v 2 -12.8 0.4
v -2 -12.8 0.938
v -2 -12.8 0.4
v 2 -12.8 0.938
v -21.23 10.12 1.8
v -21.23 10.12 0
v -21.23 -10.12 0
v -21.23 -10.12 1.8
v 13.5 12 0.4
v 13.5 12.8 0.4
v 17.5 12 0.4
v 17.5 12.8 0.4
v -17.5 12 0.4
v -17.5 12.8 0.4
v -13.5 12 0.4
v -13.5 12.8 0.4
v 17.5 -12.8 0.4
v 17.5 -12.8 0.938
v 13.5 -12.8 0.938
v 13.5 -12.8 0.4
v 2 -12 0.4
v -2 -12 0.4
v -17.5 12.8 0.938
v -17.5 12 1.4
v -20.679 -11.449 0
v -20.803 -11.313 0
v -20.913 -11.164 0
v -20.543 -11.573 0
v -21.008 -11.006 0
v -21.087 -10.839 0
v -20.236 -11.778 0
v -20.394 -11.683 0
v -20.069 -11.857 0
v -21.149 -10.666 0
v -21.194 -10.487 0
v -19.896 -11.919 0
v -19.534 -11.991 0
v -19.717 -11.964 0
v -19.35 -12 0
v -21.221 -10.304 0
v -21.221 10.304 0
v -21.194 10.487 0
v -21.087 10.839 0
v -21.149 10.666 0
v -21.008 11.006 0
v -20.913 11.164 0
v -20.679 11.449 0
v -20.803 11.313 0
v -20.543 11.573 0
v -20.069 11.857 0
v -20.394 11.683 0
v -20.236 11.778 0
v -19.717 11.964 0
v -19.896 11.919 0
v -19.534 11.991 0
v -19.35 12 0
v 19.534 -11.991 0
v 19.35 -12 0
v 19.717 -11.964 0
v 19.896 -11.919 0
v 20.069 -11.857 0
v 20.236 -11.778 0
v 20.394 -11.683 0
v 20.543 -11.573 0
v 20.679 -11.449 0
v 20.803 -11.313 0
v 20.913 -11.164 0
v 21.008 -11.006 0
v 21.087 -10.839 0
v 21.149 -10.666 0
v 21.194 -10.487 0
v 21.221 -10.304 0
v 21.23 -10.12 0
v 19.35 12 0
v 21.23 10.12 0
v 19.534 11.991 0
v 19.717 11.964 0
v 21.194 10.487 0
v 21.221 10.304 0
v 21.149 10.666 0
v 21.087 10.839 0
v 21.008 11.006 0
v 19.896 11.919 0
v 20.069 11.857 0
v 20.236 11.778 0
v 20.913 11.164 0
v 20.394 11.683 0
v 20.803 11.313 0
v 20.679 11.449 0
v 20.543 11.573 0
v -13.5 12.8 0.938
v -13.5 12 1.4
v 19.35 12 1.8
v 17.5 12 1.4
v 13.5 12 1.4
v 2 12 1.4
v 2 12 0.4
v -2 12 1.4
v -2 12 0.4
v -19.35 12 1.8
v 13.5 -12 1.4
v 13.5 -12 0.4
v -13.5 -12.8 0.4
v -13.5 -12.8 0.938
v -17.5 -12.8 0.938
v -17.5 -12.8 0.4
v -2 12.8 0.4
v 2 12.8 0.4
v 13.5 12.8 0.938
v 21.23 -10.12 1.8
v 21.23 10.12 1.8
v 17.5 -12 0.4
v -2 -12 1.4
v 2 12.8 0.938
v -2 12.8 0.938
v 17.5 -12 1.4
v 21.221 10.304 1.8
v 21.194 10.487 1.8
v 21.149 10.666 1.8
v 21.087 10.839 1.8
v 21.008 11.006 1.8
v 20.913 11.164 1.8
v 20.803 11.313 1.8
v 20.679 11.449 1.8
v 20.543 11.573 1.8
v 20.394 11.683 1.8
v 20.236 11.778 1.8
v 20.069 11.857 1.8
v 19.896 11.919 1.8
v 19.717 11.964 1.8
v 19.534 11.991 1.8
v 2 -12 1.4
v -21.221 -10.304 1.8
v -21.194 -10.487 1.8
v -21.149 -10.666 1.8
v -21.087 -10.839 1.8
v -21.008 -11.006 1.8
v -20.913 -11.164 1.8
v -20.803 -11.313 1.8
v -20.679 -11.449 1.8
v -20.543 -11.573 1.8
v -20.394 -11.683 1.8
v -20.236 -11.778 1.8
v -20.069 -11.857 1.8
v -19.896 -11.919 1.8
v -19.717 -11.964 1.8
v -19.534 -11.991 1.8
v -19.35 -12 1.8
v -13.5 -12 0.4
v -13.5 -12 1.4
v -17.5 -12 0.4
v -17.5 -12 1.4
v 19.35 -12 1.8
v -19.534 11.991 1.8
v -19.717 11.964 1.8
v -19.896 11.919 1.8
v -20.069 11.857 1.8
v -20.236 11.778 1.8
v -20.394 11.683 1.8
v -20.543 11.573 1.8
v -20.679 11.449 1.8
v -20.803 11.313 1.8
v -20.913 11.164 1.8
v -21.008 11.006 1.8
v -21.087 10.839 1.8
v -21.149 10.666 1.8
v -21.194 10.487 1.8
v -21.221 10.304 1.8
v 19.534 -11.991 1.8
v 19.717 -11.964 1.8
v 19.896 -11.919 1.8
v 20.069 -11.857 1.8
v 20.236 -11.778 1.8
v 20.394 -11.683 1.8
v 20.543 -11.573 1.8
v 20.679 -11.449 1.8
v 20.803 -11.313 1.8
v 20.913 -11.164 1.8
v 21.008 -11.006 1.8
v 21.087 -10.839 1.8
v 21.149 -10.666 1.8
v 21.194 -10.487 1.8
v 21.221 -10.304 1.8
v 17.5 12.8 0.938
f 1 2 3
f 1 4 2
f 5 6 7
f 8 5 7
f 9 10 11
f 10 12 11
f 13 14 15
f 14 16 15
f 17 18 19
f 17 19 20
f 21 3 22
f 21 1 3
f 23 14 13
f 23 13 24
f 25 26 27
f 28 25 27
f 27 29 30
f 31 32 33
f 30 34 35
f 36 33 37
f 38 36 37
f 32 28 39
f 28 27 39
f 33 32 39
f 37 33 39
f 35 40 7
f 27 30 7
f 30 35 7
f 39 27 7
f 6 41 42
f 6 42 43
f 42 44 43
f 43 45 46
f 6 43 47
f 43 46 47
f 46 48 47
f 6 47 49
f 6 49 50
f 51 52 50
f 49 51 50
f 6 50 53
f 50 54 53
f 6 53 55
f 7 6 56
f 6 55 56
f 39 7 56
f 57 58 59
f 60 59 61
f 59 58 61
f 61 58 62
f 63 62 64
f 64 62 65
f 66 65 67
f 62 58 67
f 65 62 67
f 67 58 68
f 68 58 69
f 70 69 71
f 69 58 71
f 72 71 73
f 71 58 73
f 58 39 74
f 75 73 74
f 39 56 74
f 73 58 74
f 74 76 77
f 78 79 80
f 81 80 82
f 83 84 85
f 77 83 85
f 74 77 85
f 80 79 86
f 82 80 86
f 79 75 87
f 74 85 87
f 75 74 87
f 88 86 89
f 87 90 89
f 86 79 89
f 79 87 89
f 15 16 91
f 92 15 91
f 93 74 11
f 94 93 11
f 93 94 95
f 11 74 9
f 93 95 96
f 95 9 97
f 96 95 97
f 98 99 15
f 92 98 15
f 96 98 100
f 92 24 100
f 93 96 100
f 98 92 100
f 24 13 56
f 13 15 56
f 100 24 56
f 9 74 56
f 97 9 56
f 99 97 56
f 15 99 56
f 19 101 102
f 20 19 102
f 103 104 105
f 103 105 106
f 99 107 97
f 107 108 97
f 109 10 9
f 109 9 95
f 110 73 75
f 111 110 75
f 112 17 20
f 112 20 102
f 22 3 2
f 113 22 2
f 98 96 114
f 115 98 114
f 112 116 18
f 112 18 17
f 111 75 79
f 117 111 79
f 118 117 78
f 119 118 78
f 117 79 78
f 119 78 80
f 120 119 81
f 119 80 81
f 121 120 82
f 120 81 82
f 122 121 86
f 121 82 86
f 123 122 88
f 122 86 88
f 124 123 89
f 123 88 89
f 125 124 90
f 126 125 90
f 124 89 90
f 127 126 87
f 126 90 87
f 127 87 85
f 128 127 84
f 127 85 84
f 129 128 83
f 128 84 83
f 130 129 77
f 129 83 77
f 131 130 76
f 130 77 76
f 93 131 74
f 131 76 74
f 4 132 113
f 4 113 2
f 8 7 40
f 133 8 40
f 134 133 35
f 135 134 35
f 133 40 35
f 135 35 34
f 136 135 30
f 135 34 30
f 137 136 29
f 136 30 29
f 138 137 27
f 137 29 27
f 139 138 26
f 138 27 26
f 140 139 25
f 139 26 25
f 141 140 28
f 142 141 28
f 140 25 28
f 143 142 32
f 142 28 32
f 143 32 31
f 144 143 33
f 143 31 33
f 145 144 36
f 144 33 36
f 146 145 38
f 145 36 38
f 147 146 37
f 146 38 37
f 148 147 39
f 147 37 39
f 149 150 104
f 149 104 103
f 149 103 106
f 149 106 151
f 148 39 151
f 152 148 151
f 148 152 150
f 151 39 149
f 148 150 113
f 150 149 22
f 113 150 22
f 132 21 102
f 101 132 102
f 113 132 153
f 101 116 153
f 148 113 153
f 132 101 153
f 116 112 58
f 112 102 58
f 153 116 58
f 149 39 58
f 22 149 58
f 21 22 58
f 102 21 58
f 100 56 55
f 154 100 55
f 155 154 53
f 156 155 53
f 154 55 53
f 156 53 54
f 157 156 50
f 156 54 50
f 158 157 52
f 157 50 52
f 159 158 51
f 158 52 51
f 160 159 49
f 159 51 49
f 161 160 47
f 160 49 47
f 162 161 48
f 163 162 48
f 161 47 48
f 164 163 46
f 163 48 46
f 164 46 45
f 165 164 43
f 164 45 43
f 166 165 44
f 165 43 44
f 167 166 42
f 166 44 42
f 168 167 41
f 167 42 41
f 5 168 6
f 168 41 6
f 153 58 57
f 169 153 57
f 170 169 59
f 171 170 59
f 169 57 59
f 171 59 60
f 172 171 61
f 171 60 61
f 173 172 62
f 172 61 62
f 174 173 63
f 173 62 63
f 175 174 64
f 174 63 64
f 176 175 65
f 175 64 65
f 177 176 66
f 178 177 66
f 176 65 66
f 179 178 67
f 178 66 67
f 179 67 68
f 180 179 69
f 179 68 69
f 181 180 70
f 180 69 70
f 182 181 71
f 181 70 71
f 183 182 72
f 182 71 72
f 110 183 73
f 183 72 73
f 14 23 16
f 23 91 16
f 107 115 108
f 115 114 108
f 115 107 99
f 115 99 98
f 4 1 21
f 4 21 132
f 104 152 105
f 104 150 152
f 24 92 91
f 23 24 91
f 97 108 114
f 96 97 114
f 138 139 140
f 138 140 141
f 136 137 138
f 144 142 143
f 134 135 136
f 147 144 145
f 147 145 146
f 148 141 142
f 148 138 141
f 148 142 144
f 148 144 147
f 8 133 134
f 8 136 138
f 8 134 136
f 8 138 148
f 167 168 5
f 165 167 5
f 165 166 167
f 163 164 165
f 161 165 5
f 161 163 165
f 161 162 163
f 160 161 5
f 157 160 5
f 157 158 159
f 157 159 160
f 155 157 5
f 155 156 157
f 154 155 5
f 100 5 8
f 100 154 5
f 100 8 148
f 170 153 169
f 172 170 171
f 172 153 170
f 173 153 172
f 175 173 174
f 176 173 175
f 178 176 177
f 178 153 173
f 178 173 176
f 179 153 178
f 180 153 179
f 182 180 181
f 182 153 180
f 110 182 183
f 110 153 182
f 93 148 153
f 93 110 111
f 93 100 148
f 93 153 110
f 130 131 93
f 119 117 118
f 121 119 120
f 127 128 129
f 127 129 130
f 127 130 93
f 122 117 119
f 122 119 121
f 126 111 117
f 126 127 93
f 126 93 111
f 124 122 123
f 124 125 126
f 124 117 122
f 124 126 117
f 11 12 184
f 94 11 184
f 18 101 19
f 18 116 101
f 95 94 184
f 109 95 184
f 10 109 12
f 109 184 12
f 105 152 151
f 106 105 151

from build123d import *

# Parameters (mm, degrees)
BOSS_EXTRUDE1_DEPTH    = 1.8
LATCH_DEPTH            = 2
LPATTERN1_COUNT        = 2
LPATTERN1_PITCH        = 15.5
LPATTERN1_COPY_1_DEPTH = 2
LPATTERN2_COUNT        = 2
LPATTERN2_PITCH        = 15.5
LPATTERN2_COPY_1_DEPTH = 2


with BuildPart() as part:
    # Sketch1 → Boss-Extrude1 (new body)
    with BuildSketch(Plane.XY):
        with BuildLine():
            Line((-21.23, 10.12), (-21.23, -10.12))
            ThreePointArc((-21.23, -10.12), (-20.679360749, -11.449360749), (-19.35, -12))
            Line((-19.35, -12), (19.35, -12))
            ThreePointArc((19.35, -12), (20.679360749, -11.449360749), (21.23, -10.12))
            Line((21.23, -10.12), (21.23, 10.12))
            ThreePointArc((21.23, 10.12), (20.679360749, 11.449360749), (19.35, 12))
            Line((19.35, 12), (-19.35, 12))
            ThreePointArc((-19.35, 12), (-20.679360749, 11.449360749), (-21.23, 10.12))
        make_face()
    extrude(amount=BOSS_EXTRUDE1_DEPTH)

    # Sketch4 → Latch (add, symmetric)
    with BuildSketch(Plane(origin=(0, 0, 0), x_dir=(0, 0, -1), z_dir=(1, 0, 0))):
        Polygon((-1.4, 12), (-0.938119785, 12.8), (-0.4, 12.8), (-0.4, 12), align=None)
    latch = extrude(amount=LATCH_DEPTH, both=True)

    # Mirror1: Latch across plane
    add(latch.mirror(Plane.ZX))

    # LPattern1: Latch ×2
    with Locations(*[(i * LPATTERN1_PITCH, 0, 0) for i in range(1, LPATTERN1_COUNT)]):
        add(latch)

    # LPattern1 copy 1 sketch → LPattern1 copy 1 (add, symmetric)
    with BuildSketch(Plane(origin=(15.5, 0, 0), x_dir=(0, 0, -1), z_dir=(1, 0, 0))):
        Polygon((-1.4, -12), (-0.938119785, -12.8), (-0.4, -12.8), (-0.4, -12), align=None)
    extrude(amount=LPATTERN1_COPY_1_DEPTH, both=True)

    # LPattern2: Latch ×2
    with Locations(*[(-i * LPATTERN2_PITCH, 0, 0) for i in range(1, LPATTERN2_COUNT)]):
        add(latch)

    # LPattern2 copy 1 sketch → LPattern2 copy 1 (add, symmetric)
    with BuildSketch(Plane(origin=(-15.5, 0, 0), x_dir=(0, 0, -1), z_dir=(1, 0, 0))):
        Polygon((-1.4, -12), (-0.938119785, -12.8), (-0.4, -12.8), (-0.4, -12), align=None)
    extrude(amount=LPATTERN2_COPY_1_DEPTH, both=True)


solid = part.part
